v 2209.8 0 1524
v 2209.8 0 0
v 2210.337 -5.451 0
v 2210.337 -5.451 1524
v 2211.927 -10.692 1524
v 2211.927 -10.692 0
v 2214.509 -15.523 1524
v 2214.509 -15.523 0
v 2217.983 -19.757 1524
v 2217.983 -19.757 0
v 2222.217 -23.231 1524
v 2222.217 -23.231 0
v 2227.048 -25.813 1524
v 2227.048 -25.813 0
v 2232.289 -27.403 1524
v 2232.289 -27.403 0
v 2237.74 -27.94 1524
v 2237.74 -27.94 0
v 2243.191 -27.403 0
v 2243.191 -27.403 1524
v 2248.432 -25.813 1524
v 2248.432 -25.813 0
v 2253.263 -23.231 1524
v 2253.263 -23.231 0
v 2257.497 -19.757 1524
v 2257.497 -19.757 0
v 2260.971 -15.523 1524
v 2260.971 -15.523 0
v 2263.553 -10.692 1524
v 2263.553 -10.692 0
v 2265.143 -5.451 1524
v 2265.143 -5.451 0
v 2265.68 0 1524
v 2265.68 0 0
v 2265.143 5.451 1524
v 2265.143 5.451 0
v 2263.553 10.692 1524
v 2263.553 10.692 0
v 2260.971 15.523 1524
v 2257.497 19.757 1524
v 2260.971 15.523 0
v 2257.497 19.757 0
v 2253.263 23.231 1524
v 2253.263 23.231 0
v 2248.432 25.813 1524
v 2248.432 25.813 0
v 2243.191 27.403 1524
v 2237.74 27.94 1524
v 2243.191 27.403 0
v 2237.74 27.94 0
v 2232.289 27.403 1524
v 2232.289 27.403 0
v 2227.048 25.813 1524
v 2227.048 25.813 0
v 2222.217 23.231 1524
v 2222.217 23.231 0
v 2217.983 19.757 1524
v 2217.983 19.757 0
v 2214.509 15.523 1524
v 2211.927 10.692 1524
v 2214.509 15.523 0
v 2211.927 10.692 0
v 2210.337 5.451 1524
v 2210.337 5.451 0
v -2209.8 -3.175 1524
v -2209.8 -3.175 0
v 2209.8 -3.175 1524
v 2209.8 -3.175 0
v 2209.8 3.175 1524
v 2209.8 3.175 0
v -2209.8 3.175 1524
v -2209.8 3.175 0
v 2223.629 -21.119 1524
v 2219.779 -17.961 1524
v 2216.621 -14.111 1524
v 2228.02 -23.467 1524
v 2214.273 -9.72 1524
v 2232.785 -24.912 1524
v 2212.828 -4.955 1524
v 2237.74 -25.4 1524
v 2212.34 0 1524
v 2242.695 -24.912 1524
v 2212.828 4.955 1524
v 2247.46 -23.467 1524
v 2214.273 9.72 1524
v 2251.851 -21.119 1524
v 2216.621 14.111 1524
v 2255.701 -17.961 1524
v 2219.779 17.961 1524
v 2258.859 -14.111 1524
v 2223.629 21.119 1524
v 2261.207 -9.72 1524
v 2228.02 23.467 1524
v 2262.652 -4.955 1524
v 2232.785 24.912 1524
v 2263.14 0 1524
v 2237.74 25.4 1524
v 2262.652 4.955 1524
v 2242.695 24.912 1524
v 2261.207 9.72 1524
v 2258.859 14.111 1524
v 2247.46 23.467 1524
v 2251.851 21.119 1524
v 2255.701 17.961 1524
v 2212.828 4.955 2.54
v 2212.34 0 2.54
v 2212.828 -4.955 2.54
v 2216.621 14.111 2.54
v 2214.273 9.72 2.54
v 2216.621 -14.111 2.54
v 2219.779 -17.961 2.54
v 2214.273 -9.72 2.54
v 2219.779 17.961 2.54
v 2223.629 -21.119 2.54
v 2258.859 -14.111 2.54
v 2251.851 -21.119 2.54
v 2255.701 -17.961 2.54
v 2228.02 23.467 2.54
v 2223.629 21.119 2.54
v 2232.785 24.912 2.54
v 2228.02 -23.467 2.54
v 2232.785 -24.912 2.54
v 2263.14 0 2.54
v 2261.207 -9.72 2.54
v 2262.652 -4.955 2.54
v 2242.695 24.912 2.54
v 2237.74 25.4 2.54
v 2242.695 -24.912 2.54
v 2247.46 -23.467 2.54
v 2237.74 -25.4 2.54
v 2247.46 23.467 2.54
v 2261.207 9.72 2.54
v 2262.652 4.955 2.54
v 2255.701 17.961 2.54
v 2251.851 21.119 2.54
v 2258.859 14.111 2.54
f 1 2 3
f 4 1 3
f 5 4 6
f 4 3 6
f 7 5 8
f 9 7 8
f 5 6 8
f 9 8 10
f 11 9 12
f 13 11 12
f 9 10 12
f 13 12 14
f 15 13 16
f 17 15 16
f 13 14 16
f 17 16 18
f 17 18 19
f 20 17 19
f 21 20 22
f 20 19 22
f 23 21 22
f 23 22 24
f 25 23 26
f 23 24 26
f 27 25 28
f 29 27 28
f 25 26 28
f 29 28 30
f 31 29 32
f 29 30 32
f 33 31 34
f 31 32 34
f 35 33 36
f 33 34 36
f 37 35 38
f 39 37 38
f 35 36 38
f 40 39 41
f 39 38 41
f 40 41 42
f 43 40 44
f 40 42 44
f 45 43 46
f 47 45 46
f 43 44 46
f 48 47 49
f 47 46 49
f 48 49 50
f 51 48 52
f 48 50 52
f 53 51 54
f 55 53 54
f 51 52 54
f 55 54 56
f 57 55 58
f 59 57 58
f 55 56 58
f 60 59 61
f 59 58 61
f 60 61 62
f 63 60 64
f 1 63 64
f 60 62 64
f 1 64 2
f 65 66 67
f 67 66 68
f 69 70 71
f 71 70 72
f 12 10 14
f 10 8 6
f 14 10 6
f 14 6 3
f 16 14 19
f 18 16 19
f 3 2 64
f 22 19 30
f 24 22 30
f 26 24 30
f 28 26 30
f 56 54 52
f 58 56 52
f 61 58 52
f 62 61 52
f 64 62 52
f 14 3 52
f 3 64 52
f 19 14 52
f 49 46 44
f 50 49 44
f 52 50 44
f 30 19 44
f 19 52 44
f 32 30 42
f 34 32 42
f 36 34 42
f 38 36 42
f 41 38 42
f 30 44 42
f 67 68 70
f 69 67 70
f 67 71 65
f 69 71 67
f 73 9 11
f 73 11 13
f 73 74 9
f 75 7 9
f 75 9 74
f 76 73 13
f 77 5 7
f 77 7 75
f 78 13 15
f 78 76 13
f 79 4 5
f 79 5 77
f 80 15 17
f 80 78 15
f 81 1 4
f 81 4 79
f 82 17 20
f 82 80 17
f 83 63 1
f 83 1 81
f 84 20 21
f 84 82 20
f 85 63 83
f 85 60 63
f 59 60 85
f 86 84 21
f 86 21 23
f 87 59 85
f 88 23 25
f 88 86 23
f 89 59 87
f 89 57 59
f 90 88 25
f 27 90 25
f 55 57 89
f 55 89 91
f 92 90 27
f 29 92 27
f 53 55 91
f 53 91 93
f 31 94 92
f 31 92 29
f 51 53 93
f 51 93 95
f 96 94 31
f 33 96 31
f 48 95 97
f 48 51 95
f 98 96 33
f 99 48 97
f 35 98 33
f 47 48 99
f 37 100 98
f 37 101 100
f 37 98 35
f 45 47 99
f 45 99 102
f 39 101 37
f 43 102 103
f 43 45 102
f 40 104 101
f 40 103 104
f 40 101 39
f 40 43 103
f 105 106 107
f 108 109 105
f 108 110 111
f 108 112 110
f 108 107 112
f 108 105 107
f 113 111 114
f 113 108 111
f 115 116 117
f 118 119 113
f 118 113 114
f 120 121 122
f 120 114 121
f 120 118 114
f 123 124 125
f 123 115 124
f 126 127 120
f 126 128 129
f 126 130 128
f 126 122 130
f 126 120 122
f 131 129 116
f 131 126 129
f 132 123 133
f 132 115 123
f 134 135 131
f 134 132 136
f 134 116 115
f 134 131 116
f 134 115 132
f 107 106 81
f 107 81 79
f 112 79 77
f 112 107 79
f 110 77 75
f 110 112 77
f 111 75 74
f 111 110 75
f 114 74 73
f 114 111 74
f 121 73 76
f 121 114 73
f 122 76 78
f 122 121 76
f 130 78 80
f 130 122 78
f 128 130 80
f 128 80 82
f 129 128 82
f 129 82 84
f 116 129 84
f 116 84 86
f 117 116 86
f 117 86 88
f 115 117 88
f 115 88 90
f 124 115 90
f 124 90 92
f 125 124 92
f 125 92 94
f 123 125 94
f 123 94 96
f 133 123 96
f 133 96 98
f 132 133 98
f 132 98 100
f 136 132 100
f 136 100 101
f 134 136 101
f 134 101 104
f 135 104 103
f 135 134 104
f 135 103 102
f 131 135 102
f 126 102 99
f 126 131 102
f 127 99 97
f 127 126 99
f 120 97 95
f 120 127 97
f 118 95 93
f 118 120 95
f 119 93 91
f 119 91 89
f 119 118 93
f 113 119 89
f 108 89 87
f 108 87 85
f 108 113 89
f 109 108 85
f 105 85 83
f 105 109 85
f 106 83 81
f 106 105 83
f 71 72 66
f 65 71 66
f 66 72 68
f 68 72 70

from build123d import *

# Parameters (mm, degrees)
F1_DEPTH = 1524
F2_T     = -2.54


with BuildPart() as f1:
    # F0 (on Top) → F1 (new body)
    with BuildSketch(Plane.XY):
        with BuildLine():
            ThreePointArc((2265.68, 0), (2237.74, 27.94), (2209.8, 0))
            ThreePointArc((2209.8, 0), (2237.74, -27.94), (2265.68, 0))
        make_face()
    extrude(amount=F1_DEPTH)

    # F2
    f2_openings = [f1.faces().sort_by_distance(p)[0] for p in [
        (2237.74, 0, 1524),
    ]]
    offset(amount=F2_T, openings=f2_openings)


with BuildPart() as f1b:
    # F0 (on Top) → F1, piece 2 (new body)
    with BuildSketch(Plane.XY):
        Polygon((2209.8, 0), (2209.8, 3.175), (-2209.8, 3.175), (-2209.8, -3.175), (2209.8, -3.175), align=None)
    extrude(amount=F1_DEPTH)


solid = Compound([f1.part, f1b.part])
